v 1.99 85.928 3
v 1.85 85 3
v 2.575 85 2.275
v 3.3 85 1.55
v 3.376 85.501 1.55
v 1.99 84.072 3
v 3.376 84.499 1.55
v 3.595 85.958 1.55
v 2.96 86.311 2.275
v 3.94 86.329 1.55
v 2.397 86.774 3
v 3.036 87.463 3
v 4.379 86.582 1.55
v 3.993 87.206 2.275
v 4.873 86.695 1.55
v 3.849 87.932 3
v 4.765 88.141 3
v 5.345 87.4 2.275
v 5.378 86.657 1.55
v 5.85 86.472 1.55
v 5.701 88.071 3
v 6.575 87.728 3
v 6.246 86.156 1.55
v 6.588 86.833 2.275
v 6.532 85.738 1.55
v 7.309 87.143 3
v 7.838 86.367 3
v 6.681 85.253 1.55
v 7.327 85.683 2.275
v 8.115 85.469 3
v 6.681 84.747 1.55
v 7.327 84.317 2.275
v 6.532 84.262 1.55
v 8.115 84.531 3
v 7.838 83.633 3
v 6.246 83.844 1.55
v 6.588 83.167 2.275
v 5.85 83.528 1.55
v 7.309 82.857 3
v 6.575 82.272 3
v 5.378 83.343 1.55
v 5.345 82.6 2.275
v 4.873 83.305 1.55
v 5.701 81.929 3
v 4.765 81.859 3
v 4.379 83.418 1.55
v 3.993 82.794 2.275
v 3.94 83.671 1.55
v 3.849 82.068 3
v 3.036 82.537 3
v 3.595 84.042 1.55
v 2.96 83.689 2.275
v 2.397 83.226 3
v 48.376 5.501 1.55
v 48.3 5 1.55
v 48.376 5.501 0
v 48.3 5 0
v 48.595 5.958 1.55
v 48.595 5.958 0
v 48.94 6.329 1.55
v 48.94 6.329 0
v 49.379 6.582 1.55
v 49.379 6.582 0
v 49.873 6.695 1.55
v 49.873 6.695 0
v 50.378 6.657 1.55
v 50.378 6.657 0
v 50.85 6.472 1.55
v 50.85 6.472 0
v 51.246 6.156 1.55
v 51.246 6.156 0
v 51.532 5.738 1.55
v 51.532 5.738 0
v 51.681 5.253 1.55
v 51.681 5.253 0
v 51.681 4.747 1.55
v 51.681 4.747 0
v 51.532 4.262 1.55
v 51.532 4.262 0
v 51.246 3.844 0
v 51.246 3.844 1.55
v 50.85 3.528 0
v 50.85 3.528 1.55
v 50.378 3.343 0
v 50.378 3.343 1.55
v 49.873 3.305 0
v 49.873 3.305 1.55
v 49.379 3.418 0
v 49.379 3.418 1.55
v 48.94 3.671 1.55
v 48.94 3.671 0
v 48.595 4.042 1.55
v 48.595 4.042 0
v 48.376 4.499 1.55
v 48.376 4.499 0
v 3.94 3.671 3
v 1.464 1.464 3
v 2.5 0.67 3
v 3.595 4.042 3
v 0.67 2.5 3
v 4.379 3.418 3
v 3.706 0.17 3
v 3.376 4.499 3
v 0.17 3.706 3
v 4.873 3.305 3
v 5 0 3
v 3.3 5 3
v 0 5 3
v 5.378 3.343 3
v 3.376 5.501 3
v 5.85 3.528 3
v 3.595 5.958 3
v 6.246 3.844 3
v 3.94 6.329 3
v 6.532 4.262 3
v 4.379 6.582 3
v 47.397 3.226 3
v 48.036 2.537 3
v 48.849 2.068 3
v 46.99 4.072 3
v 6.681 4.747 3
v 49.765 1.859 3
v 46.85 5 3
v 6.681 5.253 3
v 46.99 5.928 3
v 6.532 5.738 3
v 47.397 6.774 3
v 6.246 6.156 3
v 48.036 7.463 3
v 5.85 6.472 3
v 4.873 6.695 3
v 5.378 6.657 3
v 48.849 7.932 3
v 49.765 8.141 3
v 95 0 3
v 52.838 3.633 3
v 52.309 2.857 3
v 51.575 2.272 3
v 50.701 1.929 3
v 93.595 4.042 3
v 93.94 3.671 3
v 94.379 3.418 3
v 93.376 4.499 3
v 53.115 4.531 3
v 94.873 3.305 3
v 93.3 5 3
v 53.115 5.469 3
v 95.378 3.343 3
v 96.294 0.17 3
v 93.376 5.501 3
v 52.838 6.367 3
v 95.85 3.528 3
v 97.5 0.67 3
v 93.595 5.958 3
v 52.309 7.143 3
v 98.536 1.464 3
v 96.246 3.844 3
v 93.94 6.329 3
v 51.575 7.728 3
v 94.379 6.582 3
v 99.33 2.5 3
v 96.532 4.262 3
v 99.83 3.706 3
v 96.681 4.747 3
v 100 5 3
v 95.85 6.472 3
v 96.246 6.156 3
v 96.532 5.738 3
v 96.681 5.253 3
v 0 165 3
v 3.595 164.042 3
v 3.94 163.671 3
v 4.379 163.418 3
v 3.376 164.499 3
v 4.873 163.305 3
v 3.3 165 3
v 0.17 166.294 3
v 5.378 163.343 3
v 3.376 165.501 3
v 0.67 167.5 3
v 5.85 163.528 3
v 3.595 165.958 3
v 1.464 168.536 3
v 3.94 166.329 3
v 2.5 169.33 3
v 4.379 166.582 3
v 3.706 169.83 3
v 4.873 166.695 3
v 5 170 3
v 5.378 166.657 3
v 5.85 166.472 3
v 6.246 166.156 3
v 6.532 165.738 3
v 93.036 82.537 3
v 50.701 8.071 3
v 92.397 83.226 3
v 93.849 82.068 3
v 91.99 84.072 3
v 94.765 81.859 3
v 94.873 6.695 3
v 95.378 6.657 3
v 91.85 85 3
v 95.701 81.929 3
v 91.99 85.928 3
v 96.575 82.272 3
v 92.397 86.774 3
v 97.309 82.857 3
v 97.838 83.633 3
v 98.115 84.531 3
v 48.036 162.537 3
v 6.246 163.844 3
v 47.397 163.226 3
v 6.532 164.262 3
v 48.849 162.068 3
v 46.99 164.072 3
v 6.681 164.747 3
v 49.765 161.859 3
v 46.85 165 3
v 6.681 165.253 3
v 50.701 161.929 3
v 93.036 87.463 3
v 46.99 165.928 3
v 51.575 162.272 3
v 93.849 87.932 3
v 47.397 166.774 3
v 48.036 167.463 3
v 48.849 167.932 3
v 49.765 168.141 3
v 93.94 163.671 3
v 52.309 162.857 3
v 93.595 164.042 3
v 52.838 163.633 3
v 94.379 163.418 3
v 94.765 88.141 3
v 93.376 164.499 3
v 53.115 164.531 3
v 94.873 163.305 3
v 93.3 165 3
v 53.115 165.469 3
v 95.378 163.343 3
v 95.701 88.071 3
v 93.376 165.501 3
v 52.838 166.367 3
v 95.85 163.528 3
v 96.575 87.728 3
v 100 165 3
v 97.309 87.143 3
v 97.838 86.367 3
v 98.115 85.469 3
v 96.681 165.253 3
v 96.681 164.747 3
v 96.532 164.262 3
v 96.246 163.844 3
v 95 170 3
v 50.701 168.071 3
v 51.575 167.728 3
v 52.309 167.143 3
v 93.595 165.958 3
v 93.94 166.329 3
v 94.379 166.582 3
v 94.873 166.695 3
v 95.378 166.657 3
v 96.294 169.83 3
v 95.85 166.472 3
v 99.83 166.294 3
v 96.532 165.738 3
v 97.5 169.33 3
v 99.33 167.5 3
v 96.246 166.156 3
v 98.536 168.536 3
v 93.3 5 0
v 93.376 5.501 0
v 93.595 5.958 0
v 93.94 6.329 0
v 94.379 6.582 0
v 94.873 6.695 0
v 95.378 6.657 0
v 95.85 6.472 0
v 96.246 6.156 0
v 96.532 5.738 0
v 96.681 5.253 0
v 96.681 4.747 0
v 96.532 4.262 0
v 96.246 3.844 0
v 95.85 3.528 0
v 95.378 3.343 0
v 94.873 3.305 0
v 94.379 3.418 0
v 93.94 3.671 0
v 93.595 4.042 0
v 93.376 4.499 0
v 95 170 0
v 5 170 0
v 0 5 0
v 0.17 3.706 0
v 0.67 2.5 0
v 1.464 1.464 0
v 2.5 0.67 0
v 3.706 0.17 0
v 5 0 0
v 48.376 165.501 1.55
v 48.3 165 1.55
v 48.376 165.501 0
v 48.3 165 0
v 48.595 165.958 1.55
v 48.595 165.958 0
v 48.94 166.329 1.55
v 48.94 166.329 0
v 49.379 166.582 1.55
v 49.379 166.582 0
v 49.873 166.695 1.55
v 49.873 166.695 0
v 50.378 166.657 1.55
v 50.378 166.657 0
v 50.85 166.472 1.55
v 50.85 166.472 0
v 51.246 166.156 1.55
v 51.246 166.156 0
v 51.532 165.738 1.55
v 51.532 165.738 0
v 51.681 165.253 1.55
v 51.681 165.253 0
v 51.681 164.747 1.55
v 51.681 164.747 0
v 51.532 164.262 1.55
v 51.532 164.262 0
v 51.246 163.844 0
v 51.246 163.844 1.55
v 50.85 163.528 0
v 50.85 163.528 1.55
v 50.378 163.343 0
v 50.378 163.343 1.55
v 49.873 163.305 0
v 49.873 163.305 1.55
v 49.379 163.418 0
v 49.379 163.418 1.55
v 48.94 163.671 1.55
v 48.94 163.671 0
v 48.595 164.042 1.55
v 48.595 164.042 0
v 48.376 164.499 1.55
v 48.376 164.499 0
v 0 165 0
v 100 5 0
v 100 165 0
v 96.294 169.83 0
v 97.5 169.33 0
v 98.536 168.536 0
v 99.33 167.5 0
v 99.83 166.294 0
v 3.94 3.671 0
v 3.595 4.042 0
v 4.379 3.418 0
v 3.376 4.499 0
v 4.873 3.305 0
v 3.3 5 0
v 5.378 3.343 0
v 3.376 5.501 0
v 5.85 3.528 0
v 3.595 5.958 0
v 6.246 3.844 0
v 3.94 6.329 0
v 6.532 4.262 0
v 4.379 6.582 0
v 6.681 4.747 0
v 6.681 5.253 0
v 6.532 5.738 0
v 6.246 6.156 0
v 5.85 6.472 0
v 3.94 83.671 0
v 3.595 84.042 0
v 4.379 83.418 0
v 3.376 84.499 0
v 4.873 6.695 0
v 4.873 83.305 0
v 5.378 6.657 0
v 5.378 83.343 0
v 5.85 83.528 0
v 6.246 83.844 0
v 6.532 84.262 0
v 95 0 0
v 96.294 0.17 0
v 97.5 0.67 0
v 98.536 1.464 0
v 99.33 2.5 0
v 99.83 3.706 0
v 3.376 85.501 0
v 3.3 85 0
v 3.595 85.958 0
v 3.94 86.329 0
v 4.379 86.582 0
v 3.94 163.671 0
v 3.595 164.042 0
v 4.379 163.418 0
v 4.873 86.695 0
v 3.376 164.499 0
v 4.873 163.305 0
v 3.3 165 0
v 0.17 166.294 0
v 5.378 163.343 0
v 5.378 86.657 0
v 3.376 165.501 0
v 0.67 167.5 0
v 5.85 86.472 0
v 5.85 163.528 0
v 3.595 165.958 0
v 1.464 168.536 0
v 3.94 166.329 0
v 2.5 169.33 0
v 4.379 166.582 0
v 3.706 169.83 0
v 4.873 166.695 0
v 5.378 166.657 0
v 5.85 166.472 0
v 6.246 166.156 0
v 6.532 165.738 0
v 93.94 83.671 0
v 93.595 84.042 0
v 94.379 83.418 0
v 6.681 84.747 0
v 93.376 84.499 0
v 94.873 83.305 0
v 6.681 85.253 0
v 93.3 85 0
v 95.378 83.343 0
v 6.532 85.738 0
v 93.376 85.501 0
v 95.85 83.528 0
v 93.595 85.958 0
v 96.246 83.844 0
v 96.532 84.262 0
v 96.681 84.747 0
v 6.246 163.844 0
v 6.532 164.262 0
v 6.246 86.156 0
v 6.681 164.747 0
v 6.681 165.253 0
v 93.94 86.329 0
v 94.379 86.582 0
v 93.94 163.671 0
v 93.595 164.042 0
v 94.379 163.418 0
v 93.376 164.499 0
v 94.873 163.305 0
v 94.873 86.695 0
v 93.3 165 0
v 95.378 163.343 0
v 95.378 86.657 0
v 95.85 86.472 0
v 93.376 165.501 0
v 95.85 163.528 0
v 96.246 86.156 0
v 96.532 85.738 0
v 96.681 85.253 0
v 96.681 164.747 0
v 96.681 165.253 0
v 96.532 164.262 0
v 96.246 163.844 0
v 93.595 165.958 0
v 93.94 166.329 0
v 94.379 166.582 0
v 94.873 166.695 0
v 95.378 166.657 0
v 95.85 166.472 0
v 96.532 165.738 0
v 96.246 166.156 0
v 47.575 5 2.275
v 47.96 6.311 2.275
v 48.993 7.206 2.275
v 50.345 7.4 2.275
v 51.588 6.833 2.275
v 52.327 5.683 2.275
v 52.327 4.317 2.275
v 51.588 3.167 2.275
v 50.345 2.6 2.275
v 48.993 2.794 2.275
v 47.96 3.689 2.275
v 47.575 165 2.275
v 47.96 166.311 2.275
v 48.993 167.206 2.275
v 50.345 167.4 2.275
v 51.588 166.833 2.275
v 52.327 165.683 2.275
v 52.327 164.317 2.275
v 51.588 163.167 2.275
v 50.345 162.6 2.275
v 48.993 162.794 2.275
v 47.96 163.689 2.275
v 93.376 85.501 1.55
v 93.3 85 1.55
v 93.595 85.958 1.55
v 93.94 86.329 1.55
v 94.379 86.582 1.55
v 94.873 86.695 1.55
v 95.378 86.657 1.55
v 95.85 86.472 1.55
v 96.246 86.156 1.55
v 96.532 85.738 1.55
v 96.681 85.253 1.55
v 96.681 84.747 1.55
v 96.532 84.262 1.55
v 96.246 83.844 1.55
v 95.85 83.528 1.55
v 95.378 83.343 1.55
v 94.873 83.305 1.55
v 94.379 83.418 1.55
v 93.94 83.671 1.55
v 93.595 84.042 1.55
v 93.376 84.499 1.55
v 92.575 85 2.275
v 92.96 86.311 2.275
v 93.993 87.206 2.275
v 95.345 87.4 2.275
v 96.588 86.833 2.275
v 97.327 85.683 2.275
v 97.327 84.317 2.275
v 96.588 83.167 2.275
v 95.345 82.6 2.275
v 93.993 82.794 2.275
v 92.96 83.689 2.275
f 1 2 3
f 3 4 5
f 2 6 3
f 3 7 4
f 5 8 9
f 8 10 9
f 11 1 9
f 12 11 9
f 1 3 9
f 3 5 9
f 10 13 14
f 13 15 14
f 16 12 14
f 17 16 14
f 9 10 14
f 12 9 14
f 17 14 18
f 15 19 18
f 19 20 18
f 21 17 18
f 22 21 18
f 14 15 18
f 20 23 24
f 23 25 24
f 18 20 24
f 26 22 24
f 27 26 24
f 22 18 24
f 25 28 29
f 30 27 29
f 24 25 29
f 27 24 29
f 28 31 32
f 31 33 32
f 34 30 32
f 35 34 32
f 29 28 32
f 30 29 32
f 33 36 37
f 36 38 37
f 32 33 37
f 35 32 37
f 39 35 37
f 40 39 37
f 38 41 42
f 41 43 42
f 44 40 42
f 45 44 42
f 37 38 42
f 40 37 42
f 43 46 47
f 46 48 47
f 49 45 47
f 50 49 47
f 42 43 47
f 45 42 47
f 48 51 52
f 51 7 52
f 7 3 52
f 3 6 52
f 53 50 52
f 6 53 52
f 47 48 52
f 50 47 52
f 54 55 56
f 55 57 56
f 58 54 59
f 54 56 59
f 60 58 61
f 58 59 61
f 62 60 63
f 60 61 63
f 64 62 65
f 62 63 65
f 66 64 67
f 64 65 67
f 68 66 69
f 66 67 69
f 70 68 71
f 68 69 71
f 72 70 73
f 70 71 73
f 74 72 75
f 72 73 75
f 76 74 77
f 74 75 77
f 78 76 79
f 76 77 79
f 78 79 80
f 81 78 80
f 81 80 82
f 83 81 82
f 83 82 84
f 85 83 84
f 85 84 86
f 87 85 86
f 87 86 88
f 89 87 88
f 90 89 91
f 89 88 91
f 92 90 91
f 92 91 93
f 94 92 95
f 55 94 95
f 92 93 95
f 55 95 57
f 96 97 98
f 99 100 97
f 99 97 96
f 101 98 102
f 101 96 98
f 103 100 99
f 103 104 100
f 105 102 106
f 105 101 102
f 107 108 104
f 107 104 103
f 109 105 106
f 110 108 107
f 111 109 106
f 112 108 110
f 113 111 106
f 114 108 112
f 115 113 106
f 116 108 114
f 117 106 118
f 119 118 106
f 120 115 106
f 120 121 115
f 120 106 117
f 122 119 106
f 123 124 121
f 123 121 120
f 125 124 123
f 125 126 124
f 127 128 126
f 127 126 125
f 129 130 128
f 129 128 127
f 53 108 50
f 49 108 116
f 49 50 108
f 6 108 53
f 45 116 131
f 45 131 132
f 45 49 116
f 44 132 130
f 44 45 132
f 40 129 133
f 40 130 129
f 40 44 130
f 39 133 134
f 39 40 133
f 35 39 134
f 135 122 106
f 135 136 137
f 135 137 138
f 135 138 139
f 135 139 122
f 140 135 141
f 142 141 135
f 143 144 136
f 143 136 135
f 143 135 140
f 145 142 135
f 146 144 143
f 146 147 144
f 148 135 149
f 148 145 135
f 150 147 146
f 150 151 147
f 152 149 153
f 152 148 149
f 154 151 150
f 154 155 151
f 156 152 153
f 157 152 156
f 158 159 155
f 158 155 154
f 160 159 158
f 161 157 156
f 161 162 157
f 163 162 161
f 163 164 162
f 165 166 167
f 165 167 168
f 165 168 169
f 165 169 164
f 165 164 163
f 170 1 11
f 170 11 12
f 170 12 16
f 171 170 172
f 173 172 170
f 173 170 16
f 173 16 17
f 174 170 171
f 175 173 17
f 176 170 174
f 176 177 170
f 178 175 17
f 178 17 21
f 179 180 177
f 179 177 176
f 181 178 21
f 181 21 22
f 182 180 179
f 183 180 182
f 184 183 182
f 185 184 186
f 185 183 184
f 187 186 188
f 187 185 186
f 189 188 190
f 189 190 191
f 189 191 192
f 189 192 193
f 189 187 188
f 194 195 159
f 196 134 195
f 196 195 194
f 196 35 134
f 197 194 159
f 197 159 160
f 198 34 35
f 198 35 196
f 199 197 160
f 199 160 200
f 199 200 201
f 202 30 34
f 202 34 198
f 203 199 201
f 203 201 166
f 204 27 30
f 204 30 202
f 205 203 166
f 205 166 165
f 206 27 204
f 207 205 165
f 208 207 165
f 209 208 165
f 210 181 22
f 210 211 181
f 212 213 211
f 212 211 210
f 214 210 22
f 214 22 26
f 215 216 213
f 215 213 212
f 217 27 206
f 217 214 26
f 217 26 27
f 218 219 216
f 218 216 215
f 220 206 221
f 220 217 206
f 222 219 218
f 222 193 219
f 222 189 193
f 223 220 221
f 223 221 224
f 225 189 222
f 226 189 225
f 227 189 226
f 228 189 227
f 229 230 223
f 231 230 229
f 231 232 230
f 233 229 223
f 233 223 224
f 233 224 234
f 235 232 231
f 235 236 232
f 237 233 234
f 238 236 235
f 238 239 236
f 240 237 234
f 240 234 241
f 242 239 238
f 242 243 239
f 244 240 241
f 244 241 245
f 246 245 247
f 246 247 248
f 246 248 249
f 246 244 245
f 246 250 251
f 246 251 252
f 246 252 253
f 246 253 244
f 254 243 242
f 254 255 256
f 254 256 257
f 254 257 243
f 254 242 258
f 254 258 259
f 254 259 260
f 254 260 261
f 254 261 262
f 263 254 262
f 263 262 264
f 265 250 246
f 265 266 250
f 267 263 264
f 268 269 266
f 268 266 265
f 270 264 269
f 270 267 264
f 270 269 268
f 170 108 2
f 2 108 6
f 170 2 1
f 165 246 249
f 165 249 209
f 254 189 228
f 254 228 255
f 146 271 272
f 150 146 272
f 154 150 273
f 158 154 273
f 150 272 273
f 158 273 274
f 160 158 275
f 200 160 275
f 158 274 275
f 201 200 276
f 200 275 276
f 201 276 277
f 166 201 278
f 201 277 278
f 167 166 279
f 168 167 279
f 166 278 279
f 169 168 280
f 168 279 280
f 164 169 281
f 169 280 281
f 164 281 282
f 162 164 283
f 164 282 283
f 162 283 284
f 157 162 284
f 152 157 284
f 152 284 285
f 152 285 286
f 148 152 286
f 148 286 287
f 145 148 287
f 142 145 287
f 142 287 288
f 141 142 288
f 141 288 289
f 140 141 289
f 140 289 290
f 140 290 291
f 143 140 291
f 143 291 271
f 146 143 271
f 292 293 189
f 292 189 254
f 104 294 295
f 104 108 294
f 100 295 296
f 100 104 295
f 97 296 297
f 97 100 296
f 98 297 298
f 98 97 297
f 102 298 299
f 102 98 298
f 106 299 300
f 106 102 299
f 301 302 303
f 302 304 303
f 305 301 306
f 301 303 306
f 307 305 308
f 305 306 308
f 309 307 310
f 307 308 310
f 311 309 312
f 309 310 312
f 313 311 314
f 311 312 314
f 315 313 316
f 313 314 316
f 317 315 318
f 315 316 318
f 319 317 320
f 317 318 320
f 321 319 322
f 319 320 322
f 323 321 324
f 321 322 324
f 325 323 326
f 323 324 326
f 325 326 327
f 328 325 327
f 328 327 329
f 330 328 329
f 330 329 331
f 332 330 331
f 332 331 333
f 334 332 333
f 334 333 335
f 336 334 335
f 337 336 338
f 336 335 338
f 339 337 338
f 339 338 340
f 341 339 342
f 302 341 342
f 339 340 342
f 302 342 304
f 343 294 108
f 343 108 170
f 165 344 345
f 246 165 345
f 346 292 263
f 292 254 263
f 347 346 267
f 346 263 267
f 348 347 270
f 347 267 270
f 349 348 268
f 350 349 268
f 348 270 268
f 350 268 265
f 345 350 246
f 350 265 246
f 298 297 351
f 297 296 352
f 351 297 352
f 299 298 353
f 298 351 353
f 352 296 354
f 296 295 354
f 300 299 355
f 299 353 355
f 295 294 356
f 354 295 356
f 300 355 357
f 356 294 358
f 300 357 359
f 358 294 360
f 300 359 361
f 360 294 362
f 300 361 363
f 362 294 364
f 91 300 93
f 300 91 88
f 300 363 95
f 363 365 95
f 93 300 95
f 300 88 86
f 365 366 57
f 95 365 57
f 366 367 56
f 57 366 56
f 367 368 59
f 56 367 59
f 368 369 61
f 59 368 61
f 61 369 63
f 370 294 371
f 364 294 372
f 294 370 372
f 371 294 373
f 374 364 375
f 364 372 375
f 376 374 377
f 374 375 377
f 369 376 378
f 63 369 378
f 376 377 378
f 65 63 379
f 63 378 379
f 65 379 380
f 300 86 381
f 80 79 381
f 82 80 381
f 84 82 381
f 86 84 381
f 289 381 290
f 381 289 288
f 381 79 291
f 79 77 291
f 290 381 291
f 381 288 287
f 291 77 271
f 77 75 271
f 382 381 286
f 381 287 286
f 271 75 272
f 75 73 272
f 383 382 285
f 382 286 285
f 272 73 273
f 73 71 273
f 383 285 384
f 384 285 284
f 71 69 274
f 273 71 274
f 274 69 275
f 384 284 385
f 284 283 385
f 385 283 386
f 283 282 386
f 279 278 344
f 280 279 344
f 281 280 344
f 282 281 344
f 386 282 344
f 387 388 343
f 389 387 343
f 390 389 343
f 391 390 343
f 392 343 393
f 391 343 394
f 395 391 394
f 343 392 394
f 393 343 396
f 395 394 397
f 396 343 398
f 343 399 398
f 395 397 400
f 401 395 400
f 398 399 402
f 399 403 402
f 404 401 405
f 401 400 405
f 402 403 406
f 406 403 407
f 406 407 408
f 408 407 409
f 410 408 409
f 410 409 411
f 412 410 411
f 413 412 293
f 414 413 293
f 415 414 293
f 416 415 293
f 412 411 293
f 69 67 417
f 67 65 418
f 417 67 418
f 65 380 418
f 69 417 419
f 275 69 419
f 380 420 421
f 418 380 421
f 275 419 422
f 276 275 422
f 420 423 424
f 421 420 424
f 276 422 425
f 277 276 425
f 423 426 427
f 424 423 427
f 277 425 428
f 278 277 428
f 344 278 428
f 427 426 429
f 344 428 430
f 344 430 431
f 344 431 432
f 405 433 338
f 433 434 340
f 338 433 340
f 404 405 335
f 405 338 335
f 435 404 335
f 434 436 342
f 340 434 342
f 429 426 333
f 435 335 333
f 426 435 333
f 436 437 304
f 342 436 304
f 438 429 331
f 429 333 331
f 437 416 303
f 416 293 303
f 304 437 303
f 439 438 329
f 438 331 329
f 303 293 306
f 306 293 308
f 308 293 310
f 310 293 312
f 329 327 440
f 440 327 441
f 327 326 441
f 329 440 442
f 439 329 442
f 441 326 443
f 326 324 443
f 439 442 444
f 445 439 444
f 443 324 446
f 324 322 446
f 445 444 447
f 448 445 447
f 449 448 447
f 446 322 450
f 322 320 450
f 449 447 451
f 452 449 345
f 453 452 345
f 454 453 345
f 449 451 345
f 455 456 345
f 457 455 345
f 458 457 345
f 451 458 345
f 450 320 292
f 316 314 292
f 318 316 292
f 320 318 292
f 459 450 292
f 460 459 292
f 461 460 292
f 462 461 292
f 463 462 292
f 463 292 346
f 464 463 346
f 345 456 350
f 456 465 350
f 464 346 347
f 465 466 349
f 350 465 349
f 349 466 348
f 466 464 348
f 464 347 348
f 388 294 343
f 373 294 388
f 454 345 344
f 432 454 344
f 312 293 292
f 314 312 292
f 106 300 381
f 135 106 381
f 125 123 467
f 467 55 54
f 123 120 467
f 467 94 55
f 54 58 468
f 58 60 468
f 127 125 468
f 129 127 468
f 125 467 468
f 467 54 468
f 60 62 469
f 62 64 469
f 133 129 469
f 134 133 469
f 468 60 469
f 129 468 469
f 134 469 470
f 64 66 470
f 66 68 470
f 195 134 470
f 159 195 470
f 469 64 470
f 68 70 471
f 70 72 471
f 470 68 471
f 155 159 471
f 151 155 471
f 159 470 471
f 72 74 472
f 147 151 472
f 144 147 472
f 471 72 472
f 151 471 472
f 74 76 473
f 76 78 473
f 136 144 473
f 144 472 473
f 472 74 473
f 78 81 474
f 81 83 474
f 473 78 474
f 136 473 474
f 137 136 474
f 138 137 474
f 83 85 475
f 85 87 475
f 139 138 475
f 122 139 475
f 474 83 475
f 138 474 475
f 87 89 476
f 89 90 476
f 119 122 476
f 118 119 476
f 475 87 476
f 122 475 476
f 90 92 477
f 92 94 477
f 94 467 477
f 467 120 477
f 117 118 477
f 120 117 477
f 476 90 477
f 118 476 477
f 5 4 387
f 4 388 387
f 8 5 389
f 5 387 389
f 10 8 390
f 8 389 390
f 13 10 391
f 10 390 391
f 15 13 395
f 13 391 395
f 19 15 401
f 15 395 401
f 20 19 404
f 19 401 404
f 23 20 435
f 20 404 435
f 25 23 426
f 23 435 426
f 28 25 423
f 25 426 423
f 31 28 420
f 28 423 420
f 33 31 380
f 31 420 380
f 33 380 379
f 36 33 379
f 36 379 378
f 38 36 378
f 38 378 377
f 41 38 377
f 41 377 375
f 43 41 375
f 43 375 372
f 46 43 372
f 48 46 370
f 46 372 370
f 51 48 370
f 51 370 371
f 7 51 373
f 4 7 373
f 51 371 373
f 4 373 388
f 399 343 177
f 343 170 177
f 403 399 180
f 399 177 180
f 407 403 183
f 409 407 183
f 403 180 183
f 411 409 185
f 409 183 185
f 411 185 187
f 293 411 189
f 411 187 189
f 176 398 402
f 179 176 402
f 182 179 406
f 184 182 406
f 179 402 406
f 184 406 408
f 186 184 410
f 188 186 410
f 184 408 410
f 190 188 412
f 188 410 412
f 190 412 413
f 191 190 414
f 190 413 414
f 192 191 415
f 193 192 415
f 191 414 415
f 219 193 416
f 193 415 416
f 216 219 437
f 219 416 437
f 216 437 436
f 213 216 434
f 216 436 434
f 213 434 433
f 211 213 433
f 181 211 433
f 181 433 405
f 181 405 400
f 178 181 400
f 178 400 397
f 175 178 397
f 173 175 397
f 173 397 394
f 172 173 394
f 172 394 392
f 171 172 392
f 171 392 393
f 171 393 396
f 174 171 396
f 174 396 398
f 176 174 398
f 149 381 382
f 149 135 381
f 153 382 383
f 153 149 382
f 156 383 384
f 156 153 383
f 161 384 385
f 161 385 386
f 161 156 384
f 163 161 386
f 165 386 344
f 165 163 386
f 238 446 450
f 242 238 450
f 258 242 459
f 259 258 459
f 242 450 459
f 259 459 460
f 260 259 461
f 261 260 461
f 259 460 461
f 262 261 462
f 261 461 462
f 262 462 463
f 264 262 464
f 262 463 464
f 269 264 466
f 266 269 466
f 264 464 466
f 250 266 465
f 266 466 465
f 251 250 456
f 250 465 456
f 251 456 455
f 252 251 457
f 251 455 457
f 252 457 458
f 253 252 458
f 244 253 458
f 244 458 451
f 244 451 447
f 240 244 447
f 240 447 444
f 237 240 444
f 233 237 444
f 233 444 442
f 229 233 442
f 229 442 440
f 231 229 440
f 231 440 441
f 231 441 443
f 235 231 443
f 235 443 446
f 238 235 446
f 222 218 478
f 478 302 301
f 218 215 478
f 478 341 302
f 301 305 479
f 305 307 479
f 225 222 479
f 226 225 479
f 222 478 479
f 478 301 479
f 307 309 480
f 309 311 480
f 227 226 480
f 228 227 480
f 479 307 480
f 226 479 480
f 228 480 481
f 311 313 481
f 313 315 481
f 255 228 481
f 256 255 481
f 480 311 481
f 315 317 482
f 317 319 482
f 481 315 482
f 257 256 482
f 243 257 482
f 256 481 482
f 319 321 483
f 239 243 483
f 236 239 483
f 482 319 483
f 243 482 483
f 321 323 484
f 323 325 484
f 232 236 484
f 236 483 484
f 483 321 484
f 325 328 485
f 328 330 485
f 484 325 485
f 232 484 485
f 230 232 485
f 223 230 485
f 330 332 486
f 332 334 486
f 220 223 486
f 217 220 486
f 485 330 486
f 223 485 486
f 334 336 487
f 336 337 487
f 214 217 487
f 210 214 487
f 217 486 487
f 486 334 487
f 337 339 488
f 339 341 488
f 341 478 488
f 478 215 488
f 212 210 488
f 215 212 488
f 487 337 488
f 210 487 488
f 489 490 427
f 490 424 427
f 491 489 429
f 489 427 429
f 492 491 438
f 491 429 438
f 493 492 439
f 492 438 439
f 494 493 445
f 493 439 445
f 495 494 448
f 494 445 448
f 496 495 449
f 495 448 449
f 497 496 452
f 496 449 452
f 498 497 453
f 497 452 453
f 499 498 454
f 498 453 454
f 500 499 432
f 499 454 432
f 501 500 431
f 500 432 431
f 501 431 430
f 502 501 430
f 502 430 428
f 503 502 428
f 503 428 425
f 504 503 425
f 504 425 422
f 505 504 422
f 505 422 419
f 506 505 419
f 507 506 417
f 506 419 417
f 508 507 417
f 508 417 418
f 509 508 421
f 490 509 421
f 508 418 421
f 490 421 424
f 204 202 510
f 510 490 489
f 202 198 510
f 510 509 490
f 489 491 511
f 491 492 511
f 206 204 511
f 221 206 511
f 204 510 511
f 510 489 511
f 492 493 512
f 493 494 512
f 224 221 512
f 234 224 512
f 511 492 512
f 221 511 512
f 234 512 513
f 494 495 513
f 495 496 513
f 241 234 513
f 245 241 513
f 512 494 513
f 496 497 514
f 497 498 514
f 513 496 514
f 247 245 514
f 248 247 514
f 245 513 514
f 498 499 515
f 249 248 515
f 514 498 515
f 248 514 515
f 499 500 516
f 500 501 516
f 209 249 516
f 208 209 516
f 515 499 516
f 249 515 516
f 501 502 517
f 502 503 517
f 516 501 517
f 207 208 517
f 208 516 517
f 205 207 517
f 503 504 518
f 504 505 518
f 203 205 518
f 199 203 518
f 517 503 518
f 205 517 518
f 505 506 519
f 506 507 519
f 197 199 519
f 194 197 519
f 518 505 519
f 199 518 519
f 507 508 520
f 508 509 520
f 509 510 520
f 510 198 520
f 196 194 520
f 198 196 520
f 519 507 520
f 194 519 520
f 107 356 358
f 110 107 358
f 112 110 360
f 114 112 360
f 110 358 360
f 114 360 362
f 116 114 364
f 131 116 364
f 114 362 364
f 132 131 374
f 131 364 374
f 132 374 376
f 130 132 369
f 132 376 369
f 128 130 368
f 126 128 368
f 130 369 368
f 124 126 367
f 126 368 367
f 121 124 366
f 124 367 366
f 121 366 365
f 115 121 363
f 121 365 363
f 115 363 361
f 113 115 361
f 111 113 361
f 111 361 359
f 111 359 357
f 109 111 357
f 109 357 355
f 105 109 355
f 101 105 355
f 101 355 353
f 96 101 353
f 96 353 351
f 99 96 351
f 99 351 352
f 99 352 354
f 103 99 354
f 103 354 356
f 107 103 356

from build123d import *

# Parameters (mm, degrees)
SKETCH1_W                                       = 100
SKETCH1_H                                       = 170
BOSS_EXTRUDE1_DEPTH                             = 3
M3_CLEARANCE_HOLE1_D                            = 3.4
M3_CLEARANCE_HOLE1_DEPTH                        = 7.5
M3_CLEARANCE_HOLE1_TIP                          = 1.021463052
FILLET1_R                                       = 5
CSK_FOR_M3_FLAT_HEAD_MACHINE_SCREW1_D           = 3.4
CSK_FOR_M3_FLAT_HEAD_MACHINE_SCREW1_DEPTH       = 7.5
CSK_FOR_M3_FLAT_HEAD_MACHINE_SCREW1_CSINK_D     = 6.3
CSK_FOR_M3_FLAT_HEAD_MACHINE_SCREW1_CSINK_ANGLE = 90
CSK_FOR_M3_FLAT_HEAD_MACHINE_SCREW1_TIP         = 1.021463052


with BuildPart() as part:
    # Sketch1 → Boss-Extrude1 (new body)
    with BuildSketch(Plane.XY):
        with Locations((50, 85)):
            Rectangle(SKETCH1_W, SKETCH1_H)
    extrude(amount=BOSS_EXTRUDE1_DEPTH)

    # M3 Clearance Hole1
    with Locations(Plane.XY.offset(3)):
        with Locations((5, 165), (95, 165), (95, 5), (5, 5)):
            Hole(M3_CLEARANCE_HOLE1_D / 2, depth=M3_CLEARANCE_HOLE1_DEPTH)
            with Locations((0, 0, -(M3_CLEARANCE_HOLE1_DEPTH + M3_CLEARANCE_HOLE1_TIP / 2))):  # 118° drill point
                Cone(0, M3_CLEARANCE_HOLE1_D / 2, M3_CLEARANCE_HOLE1_TIP, mode=Mode.SUBTRACT)

    # Fillet1
    fillet1_edges = [part.edges().sort_by_distance(p)[0] for p in [
        (0, 170, 1.5),
        (100, 170, 1.5),
        (100, 0, 1.5),
        (0, 0, 1.5),
    ]]
    fillet(fillet1_edges, radius=FILLET1_R)

    # CSK for M3 Flat Head Machine Screw1
    with Locations(Plane.XY.offset(3)):
        with Locations((50, 165), (50, 5), (95, 85), (5, 85)):
            CounterSinkHole(CSK_FOR_M3_FLAT_HEAD_MACHINE_SCREW1_D / 2, CSK_FOR_M3_FLAT_HEAD_MACHINE_SCREW1_CSINK_D / 2, depth=CSK_FOR_M3_FLAT_HEAD_MACHINE_SCREW1_DEPTH, counter_sink_angle=CSK_FOR_M3_FLAT_HEAD_MACHINE_SCREW1_CSINK_ANGLE)
            with Locations((0, 0, -(CSK_FOR_M3_FLAT_HEAD_MACHINE_SCREW1_DEPTH + CSK_FOR_M3_FLAT_HEAD_MACHINE_SCREW1_TIP / 2))):  # 118° drill point
                Cone(0, CSK_FOR_M3_FLAT_HEAD_MACHINE_SCREW1_D / 2, CSK_FOR_M3_FLAT_HEAD_MACHINE_SCREW1_TIP, mode=Mode.SUBTRACT)


solid = part.part
